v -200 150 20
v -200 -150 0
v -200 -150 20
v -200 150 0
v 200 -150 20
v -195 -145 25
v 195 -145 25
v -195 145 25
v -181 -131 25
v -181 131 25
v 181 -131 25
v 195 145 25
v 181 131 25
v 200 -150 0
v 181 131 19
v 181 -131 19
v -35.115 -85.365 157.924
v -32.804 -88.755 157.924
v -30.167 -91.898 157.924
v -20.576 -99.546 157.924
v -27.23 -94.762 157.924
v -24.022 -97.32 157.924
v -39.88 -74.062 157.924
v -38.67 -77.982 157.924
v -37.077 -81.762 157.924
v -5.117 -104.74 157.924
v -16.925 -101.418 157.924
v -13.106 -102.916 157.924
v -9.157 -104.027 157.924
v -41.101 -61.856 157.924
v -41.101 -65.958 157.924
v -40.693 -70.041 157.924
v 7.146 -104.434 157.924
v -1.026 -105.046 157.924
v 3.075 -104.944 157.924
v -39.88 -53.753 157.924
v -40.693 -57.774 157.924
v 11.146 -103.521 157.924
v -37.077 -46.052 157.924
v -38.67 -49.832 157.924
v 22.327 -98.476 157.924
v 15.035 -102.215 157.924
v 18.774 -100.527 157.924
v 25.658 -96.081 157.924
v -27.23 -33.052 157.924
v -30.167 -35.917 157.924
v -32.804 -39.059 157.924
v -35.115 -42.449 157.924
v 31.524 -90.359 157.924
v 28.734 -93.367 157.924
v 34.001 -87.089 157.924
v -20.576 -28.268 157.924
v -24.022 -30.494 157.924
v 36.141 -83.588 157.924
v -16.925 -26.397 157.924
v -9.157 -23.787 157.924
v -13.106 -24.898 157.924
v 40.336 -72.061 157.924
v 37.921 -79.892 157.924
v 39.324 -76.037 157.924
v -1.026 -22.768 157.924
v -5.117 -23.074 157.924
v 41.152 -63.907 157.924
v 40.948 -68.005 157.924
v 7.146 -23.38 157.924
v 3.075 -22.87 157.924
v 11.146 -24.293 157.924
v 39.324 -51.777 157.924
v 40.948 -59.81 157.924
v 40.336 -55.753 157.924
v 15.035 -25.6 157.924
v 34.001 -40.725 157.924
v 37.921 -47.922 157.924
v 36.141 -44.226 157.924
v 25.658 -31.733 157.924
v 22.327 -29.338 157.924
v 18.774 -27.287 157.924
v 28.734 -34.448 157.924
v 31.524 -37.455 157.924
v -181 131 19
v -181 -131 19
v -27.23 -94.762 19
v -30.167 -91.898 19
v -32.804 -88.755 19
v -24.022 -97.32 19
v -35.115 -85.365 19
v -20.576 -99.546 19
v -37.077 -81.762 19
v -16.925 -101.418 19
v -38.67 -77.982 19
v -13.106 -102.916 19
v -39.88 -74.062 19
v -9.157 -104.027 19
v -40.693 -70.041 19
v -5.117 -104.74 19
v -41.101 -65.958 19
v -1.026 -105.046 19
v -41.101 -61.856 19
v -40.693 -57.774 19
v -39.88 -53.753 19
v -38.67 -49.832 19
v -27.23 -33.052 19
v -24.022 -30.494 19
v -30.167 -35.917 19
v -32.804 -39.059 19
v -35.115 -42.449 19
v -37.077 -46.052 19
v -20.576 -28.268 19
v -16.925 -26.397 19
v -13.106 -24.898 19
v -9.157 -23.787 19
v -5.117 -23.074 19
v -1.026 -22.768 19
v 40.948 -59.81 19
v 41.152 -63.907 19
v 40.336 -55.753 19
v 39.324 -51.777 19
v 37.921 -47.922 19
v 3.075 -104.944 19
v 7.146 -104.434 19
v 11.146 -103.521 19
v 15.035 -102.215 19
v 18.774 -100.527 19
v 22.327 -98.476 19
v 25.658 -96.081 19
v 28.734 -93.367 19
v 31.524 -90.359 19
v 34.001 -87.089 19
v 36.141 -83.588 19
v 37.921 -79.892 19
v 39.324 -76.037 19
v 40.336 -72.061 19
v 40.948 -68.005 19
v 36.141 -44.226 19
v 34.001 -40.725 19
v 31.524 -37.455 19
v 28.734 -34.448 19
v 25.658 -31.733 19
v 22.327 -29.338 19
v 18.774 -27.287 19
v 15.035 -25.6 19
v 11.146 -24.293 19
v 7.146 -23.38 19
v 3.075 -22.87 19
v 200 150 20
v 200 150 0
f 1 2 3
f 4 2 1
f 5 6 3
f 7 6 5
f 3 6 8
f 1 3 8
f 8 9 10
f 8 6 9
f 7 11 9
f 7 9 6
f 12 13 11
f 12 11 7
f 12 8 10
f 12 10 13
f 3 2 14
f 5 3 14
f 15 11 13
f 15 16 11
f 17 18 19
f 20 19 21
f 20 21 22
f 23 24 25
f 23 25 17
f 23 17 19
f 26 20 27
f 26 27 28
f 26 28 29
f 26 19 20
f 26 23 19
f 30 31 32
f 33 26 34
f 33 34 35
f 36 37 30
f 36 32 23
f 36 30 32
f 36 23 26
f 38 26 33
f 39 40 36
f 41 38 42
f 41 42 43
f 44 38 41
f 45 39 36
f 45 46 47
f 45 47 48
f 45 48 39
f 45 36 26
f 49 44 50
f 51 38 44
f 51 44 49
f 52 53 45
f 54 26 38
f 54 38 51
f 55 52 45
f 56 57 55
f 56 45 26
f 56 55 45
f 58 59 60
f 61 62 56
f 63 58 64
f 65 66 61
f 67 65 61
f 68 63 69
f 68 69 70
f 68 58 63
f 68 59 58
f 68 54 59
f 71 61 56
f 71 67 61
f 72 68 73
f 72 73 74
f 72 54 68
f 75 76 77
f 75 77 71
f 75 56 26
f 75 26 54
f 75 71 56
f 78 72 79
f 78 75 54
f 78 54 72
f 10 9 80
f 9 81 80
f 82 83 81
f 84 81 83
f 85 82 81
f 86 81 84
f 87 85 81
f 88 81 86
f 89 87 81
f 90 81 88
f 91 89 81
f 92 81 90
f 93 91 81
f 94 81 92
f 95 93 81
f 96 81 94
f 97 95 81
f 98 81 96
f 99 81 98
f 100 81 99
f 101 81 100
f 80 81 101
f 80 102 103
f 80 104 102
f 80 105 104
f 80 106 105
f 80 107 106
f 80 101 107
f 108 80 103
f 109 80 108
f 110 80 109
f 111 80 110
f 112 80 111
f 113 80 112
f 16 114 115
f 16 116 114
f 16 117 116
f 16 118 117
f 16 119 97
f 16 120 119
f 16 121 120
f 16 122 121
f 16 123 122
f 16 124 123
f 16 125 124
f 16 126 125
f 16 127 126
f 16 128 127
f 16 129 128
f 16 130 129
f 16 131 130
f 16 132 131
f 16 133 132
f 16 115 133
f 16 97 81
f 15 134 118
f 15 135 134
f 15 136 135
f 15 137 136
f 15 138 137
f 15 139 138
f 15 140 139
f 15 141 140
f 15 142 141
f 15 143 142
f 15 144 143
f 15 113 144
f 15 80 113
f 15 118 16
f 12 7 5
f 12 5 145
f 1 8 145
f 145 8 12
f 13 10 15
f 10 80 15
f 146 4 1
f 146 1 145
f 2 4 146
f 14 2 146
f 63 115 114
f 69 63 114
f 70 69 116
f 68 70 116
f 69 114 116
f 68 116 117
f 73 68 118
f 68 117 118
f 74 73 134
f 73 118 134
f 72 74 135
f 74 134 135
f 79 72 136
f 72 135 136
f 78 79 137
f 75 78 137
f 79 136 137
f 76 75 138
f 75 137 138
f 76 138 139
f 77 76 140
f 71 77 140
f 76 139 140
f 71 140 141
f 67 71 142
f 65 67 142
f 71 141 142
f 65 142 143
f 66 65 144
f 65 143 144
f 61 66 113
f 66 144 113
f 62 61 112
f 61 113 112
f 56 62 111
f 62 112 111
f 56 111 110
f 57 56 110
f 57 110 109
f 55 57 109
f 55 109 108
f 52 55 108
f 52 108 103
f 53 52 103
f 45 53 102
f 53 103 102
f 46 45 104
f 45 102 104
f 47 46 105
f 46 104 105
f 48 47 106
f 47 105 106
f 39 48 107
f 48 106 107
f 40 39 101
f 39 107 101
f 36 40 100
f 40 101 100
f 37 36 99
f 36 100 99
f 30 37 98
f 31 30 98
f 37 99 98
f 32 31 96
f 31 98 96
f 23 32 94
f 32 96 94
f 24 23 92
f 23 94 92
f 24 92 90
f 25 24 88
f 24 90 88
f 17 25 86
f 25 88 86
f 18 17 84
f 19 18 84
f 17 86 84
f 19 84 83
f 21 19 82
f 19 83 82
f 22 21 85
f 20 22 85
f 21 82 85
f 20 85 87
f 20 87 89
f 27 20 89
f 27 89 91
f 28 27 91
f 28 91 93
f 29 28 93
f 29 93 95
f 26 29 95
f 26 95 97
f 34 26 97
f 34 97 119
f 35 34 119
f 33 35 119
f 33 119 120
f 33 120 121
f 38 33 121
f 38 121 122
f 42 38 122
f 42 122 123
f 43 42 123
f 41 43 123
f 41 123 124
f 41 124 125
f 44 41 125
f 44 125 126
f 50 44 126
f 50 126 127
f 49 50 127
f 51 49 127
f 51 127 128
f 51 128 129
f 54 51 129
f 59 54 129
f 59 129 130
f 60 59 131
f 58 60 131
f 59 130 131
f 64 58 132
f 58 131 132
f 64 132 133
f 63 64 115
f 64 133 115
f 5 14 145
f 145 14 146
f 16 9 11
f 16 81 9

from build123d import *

# Parameters (mm, degrees)
F0_W     = 400
F0_H     = 300
F1_DEPTH = 25
F2_T     = -19
F3_SIZE  = 5
F5_R     = 41.152145
F4_DEPTH = 138.924479


with BuildPart() as f1:
    # F0 (on Top) → F1 (new body)
    with BuildSketch(Plane.XY):
        Rectangle(F0_W, F0_H)
    extrude(amount=F1_DEPTH)

    # F2
    f2_openings = [f1.faces().sort_by_distance(p)[0] for p in [
        (0, 0, 25),
    ]]
    offset(amount=F2_T, openings=f2_openings)

    # F3
    f3_edges = [f1.edges().sort_by_distance(p)[0] for p in [
        (-200, 0, 25),
        (0, 150, 25),
        (200, 0, 25),
        (0, -150, 25),
    ]]
    chamfer(f3_edges, length=F3_SIZE)

    # F5 (on face) → F4 (join)
    with BuildSketch(Plane.XY.offset(19)):
        with Locations((0, -63.907109)):
            Circle(F5_R)
    extrude(amount=F4_DEPTH)


solid = f1.part
